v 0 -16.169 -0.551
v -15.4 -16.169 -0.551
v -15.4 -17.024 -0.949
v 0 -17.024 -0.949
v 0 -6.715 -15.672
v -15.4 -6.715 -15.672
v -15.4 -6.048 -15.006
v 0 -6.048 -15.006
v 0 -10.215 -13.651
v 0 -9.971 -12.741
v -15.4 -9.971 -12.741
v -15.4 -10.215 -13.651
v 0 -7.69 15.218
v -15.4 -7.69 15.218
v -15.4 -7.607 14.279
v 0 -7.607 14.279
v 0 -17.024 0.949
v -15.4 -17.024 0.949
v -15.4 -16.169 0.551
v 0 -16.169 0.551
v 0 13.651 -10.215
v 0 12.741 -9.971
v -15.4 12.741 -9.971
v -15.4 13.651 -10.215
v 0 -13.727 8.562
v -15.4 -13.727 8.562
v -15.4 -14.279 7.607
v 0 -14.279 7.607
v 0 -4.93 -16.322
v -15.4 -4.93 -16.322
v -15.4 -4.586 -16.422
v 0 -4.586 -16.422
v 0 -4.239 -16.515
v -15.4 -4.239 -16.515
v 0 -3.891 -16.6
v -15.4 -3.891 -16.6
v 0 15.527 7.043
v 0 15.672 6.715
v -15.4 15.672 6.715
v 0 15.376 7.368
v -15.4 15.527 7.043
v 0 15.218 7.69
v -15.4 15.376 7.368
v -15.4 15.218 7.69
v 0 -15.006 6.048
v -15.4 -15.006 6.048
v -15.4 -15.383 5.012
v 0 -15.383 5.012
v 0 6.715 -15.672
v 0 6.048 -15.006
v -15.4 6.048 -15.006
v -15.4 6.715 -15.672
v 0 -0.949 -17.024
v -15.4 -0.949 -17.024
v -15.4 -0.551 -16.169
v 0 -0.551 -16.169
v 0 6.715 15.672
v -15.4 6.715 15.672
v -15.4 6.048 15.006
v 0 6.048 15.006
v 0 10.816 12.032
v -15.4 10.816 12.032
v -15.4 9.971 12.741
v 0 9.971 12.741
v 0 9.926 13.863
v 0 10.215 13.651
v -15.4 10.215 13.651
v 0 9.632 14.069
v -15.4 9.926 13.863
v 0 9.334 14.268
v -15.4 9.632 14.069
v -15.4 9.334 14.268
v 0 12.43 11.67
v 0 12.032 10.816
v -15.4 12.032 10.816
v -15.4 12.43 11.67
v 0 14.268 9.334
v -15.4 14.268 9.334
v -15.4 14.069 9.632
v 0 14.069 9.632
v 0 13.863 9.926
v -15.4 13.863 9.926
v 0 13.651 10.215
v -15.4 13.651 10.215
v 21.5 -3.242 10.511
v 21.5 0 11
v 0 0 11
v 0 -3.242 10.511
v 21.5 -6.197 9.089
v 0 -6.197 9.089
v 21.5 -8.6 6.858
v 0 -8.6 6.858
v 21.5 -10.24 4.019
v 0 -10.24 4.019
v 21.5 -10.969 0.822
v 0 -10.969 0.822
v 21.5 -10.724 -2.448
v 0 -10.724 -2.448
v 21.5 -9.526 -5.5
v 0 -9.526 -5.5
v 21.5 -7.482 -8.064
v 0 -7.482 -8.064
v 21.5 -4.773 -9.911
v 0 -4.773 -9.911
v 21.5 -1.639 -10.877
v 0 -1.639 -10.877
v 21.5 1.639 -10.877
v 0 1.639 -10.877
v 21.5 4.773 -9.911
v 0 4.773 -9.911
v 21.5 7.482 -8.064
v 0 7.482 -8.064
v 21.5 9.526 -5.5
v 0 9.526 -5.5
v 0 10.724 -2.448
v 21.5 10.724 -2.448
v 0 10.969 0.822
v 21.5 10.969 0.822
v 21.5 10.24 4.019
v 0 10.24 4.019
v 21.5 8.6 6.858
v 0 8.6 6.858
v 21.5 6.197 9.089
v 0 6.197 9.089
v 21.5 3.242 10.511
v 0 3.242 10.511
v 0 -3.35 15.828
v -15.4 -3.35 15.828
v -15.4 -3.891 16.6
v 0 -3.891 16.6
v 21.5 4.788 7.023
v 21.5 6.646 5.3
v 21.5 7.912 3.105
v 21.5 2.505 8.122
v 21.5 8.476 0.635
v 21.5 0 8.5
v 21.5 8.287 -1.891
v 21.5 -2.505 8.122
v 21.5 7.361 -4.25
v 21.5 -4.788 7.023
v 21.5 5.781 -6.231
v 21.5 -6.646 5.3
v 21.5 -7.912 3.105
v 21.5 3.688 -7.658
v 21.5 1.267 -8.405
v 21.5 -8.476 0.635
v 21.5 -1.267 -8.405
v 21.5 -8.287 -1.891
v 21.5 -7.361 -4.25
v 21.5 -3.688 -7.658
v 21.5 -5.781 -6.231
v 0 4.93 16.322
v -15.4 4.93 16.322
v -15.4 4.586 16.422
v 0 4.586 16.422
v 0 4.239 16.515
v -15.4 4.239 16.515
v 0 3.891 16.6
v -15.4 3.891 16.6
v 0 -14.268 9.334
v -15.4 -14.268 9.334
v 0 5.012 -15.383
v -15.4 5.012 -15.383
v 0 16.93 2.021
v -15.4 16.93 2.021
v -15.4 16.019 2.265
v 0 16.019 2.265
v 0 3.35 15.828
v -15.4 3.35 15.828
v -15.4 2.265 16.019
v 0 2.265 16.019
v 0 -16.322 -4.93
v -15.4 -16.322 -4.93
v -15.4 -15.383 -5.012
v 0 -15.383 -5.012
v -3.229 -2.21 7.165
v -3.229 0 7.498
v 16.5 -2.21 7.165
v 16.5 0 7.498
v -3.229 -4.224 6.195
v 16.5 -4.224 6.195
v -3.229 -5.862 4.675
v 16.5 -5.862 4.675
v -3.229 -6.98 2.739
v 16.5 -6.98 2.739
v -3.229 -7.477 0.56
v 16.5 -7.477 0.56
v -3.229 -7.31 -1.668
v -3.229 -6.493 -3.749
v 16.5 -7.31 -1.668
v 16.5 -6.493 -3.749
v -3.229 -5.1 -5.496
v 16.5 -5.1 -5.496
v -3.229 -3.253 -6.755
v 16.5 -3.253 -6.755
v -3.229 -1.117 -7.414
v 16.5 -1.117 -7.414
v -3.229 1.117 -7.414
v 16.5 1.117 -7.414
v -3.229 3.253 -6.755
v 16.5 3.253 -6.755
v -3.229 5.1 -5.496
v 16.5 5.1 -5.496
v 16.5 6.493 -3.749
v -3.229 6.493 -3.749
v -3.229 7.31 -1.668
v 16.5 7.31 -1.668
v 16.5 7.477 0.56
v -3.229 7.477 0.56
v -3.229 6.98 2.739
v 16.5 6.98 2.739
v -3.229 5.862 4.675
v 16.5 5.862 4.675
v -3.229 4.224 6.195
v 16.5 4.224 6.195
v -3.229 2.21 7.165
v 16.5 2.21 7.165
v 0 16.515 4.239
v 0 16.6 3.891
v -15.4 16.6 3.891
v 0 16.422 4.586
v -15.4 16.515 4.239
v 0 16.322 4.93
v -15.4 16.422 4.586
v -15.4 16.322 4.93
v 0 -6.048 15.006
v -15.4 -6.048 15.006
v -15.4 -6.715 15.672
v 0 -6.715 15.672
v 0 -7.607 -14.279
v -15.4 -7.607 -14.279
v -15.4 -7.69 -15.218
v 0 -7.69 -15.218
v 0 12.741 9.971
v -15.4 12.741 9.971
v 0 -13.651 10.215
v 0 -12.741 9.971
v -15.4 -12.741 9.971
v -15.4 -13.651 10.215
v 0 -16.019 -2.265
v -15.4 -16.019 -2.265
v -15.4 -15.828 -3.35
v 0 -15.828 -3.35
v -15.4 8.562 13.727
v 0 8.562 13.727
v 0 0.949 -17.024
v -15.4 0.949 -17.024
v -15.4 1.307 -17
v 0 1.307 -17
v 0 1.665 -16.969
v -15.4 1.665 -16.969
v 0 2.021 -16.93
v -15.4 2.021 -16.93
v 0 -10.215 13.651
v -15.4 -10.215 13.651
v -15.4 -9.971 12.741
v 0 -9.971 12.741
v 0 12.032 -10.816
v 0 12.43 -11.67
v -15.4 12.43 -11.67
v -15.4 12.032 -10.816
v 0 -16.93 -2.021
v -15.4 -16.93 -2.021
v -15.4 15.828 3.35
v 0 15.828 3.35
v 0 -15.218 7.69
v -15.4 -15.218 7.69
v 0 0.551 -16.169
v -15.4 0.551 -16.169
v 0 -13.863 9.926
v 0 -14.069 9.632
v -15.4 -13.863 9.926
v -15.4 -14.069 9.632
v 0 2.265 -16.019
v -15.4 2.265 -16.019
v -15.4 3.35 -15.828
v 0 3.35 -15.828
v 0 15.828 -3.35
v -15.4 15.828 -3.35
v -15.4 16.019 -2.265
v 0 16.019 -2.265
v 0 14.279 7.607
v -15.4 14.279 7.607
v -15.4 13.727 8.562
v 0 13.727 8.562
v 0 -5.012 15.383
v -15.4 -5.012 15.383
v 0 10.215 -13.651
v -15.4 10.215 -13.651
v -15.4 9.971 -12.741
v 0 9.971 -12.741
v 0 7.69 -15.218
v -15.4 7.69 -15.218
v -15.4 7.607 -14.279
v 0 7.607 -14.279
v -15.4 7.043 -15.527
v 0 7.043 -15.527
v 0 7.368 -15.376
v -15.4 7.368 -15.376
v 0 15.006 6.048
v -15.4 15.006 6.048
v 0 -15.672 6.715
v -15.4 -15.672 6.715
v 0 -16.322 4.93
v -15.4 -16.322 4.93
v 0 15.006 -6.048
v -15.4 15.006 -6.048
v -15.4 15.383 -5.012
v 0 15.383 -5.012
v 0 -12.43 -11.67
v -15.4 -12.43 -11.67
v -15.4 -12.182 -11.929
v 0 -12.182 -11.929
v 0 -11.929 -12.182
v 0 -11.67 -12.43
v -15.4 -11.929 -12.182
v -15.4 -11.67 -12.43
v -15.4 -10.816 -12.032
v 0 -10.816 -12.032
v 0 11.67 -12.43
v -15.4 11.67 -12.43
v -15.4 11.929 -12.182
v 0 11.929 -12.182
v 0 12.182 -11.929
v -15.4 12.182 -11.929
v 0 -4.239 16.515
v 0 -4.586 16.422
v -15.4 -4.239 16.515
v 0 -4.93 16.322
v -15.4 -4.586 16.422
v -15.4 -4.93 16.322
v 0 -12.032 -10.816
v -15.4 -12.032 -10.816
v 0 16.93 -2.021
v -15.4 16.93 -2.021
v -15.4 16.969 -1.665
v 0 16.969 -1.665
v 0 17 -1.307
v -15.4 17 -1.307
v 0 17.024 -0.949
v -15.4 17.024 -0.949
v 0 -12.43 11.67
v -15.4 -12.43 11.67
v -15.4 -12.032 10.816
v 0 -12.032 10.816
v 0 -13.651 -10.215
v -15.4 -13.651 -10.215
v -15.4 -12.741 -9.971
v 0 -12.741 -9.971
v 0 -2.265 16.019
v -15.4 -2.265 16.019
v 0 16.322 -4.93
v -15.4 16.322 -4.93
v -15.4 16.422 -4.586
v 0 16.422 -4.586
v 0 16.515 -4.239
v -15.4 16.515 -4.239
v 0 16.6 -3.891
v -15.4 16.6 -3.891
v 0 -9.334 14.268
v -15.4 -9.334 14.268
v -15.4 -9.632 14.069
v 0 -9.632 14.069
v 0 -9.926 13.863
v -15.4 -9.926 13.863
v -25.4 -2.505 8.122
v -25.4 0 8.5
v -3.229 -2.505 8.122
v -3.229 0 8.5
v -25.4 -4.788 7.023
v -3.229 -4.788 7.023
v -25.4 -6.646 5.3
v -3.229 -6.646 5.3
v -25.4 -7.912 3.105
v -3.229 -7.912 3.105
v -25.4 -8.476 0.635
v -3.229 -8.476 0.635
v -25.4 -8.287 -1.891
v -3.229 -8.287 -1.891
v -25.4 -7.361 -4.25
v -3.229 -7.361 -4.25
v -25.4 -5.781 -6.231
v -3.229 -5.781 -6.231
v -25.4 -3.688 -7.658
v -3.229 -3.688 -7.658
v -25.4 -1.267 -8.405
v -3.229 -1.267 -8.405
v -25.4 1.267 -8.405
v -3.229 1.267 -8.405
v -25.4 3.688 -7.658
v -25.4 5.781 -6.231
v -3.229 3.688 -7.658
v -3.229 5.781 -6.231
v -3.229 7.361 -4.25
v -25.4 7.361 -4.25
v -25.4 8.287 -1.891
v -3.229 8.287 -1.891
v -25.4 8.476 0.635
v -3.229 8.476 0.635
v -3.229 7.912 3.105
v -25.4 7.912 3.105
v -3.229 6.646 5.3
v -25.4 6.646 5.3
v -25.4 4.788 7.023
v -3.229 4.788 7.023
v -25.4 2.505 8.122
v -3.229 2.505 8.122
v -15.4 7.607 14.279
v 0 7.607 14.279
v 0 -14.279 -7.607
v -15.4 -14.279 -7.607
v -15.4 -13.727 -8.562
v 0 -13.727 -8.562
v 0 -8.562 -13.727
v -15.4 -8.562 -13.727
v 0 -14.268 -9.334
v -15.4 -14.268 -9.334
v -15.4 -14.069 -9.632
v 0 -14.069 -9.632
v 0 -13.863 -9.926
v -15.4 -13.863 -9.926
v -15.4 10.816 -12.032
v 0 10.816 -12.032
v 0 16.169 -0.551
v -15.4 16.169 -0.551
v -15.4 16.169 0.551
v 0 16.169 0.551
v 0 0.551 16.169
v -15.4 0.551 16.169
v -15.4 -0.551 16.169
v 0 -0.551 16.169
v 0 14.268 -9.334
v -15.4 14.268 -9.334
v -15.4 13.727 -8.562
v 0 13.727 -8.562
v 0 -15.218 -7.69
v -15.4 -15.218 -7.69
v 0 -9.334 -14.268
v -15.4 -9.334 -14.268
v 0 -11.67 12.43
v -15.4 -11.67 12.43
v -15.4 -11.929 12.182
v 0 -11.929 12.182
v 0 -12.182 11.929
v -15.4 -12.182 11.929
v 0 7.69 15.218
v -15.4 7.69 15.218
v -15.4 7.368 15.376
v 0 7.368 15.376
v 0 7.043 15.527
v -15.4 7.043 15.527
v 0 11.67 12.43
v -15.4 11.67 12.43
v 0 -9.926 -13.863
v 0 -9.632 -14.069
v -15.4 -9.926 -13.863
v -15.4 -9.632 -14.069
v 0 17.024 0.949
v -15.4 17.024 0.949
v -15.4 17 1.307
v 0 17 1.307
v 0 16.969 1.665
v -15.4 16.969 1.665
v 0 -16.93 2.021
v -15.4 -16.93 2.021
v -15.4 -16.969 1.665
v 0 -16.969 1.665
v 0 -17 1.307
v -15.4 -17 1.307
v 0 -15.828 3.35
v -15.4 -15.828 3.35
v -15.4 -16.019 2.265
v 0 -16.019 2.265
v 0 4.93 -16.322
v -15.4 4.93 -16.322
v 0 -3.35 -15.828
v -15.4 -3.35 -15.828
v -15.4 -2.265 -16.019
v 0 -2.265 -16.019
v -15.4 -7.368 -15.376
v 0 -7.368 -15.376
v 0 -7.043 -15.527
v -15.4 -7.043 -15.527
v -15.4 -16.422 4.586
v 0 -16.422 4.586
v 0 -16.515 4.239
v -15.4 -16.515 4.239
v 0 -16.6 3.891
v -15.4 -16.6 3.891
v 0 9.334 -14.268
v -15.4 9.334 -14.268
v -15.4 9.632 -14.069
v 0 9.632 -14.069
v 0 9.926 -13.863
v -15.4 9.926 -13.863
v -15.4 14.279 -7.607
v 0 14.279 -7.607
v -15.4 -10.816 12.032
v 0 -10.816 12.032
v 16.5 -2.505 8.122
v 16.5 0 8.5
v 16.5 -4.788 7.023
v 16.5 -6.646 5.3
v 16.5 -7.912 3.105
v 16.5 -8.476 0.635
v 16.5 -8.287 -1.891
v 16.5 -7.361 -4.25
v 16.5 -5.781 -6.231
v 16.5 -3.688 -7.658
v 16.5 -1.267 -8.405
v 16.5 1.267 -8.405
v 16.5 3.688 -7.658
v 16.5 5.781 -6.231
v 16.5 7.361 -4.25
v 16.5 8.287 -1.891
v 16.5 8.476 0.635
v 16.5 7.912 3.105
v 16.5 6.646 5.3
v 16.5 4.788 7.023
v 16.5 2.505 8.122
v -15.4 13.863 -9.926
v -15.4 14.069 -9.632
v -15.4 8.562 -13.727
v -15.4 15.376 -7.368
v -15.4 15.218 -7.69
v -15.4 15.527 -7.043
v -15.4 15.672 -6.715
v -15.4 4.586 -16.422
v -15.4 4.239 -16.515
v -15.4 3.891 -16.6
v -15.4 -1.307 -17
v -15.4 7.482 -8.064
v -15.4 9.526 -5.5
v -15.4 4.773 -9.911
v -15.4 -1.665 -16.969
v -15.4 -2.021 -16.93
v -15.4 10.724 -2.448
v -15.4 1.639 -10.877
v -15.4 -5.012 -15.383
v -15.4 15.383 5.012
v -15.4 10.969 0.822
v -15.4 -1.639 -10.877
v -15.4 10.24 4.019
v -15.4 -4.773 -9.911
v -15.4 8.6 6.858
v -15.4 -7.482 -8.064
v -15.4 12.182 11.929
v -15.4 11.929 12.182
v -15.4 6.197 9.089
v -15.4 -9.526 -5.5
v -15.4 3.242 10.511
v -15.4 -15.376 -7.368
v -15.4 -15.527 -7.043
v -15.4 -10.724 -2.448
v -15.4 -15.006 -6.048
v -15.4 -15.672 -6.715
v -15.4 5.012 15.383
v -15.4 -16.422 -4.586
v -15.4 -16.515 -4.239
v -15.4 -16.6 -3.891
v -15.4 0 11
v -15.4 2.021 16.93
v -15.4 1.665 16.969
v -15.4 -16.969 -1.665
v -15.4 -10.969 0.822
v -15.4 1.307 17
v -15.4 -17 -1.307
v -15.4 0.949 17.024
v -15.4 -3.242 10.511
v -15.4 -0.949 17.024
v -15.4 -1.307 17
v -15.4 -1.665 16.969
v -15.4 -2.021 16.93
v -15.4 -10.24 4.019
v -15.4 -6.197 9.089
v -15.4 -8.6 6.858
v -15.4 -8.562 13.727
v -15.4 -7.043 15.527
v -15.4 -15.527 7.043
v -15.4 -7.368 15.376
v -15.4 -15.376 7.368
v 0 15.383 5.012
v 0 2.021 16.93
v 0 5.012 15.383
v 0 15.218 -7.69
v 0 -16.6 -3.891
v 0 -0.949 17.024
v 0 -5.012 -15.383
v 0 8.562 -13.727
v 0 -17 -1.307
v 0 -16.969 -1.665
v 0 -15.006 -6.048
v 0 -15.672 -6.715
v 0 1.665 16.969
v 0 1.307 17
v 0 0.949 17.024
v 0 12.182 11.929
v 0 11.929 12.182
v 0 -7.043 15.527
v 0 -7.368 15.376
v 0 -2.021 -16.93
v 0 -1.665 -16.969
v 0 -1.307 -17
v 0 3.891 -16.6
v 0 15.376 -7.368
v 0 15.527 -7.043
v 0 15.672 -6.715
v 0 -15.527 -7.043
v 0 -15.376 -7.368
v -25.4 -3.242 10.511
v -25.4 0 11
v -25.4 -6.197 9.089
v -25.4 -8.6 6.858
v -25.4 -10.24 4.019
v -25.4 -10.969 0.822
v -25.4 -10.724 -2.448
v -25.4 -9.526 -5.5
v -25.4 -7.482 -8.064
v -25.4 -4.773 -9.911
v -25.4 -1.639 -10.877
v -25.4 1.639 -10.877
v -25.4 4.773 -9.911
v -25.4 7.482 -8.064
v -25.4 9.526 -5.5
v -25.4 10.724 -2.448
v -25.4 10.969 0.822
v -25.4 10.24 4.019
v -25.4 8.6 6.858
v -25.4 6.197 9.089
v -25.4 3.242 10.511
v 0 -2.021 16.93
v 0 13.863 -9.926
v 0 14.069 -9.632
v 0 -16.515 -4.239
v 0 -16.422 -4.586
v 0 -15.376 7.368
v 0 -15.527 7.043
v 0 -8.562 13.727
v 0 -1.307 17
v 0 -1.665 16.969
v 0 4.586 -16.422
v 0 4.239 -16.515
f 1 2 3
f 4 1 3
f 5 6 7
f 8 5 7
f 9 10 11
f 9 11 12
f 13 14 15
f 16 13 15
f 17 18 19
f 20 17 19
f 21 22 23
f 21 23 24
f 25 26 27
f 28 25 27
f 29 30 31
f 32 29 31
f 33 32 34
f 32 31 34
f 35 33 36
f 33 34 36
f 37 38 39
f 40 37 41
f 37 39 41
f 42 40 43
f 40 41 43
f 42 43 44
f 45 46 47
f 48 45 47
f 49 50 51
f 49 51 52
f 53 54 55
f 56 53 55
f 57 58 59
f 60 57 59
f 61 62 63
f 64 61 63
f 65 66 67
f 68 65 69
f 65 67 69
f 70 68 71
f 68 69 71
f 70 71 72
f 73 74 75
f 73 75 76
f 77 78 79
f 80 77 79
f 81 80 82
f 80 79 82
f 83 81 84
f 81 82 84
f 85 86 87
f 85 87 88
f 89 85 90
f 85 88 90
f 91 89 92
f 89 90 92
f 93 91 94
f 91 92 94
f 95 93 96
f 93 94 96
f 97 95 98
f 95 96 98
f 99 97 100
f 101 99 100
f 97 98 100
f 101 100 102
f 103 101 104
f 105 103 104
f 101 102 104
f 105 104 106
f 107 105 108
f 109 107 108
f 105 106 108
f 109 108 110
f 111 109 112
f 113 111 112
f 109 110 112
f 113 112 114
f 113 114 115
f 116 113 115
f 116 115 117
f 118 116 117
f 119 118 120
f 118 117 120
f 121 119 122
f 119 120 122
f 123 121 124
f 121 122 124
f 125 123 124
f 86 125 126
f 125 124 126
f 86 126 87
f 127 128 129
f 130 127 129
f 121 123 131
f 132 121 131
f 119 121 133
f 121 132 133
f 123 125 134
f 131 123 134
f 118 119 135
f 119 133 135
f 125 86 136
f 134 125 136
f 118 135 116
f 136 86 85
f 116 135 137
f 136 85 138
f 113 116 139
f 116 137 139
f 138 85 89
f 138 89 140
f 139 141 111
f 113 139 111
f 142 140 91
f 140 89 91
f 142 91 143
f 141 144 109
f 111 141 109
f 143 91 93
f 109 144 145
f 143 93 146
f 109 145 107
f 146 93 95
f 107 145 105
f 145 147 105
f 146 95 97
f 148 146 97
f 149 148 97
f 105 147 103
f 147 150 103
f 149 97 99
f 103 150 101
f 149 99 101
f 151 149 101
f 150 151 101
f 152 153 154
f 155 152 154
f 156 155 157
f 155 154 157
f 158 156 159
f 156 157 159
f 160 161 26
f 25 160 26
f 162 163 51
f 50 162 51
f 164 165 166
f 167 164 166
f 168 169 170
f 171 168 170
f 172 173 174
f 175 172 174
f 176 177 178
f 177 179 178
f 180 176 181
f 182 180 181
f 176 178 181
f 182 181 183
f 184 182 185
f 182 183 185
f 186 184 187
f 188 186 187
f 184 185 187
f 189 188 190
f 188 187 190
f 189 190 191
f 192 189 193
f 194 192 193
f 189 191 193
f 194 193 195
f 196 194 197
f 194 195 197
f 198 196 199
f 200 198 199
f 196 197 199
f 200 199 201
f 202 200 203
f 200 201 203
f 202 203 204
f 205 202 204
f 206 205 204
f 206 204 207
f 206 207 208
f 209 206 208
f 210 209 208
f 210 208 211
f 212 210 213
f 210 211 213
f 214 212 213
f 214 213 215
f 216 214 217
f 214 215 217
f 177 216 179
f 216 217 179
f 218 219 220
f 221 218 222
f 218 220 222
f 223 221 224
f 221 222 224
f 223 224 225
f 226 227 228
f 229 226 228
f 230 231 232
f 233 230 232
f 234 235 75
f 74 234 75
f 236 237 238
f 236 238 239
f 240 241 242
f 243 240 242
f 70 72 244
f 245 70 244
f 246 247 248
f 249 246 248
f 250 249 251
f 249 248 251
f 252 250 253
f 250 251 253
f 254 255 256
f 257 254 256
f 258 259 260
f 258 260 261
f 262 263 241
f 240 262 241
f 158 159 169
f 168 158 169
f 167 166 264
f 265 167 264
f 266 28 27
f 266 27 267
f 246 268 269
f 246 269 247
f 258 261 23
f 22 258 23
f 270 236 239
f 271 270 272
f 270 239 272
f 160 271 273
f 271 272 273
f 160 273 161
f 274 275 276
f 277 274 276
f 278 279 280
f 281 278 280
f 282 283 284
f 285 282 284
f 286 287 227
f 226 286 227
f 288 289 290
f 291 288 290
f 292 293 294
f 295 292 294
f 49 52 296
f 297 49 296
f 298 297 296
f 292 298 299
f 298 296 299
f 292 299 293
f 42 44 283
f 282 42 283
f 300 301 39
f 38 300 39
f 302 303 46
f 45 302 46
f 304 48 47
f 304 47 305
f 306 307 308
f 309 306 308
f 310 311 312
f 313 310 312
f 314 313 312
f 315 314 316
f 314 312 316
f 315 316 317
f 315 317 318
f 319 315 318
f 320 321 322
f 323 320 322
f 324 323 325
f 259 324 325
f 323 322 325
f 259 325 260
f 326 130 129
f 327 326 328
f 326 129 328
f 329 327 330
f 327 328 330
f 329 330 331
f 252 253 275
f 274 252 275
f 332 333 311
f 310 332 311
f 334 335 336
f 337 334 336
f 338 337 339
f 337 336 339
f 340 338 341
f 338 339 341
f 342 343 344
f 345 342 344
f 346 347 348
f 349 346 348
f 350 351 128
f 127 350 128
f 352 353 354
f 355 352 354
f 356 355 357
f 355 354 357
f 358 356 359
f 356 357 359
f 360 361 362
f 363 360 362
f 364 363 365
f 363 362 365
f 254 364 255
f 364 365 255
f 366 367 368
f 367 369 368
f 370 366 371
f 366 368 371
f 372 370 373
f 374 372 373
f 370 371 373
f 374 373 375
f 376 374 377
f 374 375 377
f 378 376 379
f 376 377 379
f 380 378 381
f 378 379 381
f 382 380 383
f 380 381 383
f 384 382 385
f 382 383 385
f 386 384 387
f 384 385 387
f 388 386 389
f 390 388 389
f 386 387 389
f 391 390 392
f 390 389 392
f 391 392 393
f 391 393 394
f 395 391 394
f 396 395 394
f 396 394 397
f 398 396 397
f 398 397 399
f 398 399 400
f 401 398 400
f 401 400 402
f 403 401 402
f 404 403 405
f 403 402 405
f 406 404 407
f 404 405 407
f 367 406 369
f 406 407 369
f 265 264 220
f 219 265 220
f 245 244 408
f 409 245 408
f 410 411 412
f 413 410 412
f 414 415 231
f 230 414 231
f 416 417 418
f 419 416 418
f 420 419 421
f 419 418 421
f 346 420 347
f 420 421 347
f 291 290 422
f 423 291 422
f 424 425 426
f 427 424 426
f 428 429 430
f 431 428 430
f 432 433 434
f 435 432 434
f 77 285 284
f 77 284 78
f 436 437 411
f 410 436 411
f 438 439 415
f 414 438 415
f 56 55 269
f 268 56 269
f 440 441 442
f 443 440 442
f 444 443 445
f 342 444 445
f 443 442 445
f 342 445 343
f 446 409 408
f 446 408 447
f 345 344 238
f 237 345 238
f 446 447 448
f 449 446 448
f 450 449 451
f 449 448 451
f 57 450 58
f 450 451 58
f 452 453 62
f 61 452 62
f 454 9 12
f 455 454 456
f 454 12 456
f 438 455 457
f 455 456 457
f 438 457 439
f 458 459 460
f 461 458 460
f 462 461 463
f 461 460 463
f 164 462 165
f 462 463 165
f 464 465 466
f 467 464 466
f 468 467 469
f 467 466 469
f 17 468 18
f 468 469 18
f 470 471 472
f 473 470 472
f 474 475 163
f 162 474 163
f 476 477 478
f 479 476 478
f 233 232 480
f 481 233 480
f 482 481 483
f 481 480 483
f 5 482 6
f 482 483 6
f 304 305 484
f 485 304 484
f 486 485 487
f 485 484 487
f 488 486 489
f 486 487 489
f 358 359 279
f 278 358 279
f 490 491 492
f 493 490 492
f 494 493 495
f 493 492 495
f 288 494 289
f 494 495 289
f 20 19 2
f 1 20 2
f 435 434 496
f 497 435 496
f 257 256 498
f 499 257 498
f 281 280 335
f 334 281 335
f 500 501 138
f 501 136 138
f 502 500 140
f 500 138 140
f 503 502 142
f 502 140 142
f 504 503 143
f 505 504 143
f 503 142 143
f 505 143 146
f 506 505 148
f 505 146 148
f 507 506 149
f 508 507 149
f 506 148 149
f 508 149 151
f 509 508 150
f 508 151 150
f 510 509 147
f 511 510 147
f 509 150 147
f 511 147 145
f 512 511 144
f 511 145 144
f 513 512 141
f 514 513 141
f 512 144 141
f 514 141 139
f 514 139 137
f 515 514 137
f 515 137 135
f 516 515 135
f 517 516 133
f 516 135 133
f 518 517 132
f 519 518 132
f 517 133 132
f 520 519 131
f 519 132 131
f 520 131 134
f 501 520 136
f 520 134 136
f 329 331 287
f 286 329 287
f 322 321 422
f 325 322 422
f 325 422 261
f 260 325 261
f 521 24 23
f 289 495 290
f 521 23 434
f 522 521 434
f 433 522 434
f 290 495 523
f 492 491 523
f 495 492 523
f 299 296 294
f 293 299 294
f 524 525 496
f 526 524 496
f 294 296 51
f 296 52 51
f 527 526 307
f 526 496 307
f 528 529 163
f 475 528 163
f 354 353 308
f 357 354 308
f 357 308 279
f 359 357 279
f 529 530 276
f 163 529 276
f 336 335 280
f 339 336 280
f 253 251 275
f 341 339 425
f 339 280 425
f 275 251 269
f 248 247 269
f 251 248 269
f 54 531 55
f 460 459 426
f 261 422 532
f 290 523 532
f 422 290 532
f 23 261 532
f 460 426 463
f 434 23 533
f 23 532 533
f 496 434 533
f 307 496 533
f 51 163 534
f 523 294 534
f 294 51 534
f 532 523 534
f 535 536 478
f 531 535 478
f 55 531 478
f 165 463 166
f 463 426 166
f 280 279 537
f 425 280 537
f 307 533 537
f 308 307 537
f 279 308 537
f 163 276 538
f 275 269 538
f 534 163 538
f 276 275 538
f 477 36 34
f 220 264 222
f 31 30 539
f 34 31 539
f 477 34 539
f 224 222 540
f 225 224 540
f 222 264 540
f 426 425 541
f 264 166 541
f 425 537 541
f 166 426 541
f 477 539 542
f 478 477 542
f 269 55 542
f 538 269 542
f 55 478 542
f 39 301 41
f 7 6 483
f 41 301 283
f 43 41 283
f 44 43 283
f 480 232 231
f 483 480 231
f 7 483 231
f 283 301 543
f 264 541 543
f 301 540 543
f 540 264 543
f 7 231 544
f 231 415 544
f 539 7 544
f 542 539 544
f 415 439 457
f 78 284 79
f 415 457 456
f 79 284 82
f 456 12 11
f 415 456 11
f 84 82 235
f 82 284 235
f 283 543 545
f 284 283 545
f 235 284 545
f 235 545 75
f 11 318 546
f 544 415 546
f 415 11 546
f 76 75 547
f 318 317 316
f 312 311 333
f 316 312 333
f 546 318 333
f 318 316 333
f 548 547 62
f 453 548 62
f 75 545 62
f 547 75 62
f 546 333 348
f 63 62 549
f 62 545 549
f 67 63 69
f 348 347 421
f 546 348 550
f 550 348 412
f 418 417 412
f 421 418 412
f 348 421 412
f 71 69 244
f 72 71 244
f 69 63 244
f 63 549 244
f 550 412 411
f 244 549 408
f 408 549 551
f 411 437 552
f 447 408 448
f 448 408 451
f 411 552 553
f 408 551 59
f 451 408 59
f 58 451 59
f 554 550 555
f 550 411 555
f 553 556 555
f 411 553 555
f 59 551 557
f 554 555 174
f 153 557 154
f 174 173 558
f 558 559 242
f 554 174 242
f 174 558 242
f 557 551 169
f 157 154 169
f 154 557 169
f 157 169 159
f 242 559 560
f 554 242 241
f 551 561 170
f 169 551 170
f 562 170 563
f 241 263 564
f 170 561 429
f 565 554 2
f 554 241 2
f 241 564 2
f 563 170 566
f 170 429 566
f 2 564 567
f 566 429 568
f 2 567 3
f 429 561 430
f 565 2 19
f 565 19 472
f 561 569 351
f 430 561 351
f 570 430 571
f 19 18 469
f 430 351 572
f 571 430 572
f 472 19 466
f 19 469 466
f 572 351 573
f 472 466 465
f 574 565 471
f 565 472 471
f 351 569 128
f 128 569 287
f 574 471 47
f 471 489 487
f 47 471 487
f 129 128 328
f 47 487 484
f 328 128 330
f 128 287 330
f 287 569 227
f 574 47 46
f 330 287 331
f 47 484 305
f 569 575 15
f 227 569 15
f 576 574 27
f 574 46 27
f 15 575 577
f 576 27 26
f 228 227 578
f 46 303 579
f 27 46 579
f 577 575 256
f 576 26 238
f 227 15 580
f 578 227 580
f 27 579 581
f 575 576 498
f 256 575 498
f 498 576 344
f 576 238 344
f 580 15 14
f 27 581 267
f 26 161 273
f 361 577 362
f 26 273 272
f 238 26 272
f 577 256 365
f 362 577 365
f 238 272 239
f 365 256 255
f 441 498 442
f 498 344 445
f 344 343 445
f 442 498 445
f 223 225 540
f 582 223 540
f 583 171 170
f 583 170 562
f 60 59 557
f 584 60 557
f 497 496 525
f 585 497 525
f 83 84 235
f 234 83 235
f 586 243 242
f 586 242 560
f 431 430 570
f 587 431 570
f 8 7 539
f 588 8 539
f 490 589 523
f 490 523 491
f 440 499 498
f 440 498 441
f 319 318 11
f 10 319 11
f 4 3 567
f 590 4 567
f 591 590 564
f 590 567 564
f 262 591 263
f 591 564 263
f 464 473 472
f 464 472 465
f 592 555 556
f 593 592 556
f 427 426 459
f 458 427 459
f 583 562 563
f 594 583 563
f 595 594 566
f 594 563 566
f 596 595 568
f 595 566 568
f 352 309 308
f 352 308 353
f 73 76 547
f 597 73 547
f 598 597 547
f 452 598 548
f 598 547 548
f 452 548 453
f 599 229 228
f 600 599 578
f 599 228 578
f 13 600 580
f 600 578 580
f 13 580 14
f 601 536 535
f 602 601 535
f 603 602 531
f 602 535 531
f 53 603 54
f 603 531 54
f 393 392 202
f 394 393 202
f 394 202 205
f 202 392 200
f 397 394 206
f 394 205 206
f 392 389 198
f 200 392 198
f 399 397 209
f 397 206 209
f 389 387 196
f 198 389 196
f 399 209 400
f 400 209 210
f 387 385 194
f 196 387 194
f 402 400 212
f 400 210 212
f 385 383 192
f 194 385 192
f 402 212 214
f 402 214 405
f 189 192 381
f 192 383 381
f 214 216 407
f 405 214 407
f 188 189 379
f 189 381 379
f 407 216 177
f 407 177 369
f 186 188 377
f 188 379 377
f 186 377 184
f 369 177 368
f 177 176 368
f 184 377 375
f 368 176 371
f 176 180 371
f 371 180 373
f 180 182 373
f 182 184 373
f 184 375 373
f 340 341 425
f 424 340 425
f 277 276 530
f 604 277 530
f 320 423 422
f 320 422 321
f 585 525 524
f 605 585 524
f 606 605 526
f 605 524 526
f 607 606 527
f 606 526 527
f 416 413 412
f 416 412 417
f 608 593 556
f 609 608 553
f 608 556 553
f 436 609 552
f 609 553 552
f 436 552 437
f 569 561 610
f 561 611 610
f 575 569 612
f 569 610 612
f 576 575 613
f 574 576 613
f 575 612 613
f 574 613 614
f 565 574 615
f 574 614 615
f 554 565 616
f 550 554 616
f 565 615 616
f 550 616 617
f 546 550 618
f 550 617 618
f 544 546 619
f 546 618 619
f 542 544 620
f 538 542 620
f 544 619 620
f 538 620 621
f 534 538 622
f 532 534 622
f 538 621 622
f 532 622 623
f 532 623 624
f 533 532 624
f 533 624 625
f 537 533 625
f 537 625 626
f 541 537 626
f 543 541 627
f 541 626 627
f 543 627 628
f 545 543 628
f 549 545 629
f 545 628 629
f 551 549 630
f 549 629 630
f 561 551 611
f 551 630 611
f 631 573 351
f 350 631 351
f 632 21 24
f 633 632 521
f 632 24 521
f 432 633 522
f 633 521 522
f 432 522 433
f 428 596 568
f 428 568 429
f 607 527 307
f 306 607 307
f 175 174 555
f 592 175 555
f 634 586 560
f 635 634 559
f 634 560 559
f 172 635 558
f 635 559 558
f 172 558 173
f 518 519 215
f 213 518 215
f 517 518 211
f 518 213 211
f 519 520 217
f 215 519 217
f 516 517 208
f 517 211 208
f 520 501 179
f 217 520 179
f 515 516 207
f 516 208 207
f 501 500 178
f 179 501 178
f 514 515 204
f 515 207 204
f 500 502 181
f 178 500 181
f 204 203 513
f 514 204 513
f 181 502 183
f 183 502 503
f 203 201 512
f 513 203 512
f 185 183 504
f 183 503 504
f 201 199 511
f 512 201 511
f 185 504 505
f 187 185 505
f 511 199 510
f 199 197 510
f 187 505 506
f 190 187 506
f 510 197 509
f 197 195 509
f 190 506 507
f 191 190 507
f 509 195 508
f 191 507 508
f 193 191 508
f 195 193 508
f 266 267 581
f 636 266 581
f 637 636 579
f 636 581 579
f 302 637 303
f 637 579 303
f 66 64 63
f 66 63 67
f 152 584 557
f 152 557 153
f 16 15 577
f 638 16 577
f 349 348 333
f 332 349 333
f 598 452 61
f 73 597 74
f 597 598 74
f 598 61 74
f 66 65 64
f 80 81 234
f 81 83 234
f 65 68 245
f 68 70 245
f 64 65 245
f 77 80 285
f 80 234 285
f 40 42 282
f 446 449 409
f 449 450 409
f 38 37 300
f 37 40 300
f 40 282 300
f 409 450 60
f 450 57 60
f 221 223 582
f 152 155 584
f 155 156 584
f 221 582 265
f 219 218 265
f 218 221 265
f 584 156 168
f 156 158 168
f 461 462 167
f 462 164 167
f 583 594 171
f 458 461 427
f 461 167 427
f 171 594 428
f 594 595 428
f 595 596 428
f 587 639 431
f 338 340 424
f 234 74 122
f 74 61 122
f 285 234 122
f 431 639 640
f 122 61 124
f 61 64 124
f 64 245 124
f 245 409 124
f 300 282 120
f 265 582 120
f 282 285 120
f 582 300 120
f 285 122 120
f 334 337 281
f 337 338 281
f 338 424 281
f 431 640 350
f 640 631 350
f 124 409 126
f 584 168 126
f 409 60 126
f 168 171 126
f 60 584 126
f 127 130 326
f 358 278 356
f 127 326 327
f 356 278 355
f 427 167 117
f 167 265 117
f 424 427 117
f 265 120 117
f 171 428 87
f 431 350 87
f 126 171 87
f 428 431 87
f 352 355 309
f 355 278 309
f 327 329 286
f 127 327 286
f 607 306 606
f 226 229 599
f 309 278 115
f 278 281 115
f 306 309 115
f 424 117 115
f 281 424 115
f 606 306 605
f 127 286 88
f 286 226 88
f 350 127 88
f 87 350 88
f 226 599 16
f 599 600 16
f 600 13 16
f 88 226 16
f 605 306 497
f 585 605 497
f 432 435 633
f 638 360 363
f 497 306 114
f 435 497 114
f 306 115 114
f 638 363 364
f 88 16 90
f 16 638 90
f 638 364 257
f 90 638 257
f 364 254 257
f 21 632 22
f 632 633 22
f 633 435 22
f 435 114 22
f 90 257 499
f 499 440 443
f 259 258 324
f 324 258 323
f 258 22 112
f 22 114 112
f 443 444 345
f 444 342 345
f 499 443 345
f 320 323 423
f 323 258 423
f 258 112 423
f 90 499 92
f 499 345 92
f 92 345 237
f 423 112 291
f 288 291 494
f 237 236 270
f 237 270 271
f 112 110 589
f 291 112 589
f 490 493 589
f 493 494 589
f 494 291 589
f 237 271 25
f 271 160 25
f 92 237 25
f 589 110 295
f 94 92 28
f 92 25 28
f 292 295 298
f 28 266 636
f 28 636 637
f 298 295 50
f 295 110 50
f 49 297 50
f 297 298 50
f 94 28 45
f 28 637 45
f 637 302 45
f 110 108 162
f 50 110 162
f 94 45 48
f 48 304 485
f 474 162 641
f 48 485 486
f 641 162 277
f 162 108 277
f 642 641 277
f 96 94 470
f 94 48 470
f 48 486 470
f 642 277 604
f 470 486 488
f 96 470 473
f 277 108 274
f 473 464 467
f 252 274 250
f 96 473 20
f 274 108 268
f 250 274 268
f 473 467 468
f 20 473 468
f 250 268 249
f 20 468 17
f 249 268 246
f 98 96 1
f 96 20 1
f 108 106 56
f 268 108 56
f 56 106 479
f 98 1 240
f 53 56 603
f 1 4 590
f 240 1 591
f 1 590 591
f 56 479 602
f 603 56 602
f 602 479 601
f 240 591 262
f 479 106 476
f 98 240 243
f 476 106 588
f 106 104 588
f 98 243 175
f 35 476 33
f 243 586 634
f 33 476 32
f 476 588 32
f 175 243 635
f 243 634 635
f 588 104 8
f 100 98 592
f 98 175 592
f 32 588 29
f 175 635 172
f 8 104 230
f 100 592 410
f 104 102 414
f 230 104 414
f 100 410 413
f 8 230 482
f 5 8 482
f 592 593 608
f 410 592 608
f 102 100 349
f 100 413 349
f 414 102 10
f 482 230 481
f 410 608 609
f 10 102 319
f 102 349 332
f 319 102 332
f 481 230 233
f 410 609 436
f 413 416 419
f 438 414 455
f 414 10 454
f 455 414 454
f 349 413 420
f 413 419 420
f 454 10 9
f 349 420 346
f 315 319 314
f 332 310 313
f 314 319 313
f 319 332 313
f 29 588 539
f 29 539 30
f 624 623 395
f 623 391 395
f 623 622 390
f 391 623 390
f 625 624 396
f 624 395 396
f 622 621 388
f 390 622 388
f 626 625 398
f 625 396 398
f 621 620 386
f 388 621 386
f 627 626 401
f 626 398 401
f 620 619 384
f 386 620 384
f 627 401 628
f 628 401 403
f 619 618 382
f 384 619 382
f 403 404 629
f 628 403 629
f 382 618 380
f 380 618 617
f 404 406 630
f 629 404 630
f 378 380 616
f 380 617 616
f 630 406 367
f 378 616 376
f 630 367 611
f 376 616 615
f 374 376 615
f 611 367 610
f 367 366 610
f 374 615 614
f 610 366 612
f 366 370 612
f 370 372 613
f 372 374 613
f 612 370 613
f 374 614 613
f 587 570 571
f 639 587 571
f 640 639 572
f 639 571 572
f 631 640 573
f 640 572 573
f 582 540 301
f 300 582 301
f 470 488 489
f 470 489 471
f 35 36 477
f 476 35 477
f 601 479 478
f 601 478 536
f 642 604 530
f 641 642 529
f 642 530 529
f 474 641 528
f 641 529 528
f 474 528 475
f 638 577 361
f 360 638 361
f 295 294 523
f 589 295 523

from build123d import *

# Parameters (mm, degrees)
EXTRUSION1_DEPTH             = 45.079643828
R_P_TITION_CIRCULAIRE1_COUNT = 36


with BuildPart() as part:
    # Esquisse1 → Révolution1 (revolve)
    with BuildSketch(Plane.XY, mode=Mode.PRIVATE) as r_volution1_sk:
        Polygon((21.5, 8.5), (21.5, 11), (0, 11), (0, 17.05), (-15.4, 17.05), (-15.4, 11), (-25.4, 11), (-25.4, 8.5), (-3.228913747, 8.5), (-3.228913747, 7.497868496), (16.5, 7.497868496), (16.5, 8.5), align=None)
    revolve(r_volution1_sk.sketch.rotate(Axis((-31.537627468, 0, 0), (1, 0, 0)), 90), axis=Axis((-31.537627468, 0, 0), (1, 0, 0)))

    # Esquisse2 → Extrusion1 (cut, through all)
    with BuildSketch(Plane.ZY.offset(15.4)):
        Polygon((-1, 17.131935336), (-0.551103456, 16.169273591), (0.551103456, 16.169273591), (1, 17.131935336), align=None)
    extrusion1 = extrude(amount=-EXTRUSION1_DEPTH, mode=Mode.SUBTRACT)

    # Répétition circulaire1: Extrusion1 ×36 about axis
    r_p_tition_circulaire1_axis = Axis((0, 0, 0), (1, 0, 0))
    for i in range(1, R_P_TITION_CIRCULAIRE1_COUNT):
        add(extrusion1.rotate(r_p_tition_circulaire1_axis, i * 360 / R_P_TITION_CIRCULAIRE1_COUNT), mode=Mode.SUBTRACT)


solid = part.part
